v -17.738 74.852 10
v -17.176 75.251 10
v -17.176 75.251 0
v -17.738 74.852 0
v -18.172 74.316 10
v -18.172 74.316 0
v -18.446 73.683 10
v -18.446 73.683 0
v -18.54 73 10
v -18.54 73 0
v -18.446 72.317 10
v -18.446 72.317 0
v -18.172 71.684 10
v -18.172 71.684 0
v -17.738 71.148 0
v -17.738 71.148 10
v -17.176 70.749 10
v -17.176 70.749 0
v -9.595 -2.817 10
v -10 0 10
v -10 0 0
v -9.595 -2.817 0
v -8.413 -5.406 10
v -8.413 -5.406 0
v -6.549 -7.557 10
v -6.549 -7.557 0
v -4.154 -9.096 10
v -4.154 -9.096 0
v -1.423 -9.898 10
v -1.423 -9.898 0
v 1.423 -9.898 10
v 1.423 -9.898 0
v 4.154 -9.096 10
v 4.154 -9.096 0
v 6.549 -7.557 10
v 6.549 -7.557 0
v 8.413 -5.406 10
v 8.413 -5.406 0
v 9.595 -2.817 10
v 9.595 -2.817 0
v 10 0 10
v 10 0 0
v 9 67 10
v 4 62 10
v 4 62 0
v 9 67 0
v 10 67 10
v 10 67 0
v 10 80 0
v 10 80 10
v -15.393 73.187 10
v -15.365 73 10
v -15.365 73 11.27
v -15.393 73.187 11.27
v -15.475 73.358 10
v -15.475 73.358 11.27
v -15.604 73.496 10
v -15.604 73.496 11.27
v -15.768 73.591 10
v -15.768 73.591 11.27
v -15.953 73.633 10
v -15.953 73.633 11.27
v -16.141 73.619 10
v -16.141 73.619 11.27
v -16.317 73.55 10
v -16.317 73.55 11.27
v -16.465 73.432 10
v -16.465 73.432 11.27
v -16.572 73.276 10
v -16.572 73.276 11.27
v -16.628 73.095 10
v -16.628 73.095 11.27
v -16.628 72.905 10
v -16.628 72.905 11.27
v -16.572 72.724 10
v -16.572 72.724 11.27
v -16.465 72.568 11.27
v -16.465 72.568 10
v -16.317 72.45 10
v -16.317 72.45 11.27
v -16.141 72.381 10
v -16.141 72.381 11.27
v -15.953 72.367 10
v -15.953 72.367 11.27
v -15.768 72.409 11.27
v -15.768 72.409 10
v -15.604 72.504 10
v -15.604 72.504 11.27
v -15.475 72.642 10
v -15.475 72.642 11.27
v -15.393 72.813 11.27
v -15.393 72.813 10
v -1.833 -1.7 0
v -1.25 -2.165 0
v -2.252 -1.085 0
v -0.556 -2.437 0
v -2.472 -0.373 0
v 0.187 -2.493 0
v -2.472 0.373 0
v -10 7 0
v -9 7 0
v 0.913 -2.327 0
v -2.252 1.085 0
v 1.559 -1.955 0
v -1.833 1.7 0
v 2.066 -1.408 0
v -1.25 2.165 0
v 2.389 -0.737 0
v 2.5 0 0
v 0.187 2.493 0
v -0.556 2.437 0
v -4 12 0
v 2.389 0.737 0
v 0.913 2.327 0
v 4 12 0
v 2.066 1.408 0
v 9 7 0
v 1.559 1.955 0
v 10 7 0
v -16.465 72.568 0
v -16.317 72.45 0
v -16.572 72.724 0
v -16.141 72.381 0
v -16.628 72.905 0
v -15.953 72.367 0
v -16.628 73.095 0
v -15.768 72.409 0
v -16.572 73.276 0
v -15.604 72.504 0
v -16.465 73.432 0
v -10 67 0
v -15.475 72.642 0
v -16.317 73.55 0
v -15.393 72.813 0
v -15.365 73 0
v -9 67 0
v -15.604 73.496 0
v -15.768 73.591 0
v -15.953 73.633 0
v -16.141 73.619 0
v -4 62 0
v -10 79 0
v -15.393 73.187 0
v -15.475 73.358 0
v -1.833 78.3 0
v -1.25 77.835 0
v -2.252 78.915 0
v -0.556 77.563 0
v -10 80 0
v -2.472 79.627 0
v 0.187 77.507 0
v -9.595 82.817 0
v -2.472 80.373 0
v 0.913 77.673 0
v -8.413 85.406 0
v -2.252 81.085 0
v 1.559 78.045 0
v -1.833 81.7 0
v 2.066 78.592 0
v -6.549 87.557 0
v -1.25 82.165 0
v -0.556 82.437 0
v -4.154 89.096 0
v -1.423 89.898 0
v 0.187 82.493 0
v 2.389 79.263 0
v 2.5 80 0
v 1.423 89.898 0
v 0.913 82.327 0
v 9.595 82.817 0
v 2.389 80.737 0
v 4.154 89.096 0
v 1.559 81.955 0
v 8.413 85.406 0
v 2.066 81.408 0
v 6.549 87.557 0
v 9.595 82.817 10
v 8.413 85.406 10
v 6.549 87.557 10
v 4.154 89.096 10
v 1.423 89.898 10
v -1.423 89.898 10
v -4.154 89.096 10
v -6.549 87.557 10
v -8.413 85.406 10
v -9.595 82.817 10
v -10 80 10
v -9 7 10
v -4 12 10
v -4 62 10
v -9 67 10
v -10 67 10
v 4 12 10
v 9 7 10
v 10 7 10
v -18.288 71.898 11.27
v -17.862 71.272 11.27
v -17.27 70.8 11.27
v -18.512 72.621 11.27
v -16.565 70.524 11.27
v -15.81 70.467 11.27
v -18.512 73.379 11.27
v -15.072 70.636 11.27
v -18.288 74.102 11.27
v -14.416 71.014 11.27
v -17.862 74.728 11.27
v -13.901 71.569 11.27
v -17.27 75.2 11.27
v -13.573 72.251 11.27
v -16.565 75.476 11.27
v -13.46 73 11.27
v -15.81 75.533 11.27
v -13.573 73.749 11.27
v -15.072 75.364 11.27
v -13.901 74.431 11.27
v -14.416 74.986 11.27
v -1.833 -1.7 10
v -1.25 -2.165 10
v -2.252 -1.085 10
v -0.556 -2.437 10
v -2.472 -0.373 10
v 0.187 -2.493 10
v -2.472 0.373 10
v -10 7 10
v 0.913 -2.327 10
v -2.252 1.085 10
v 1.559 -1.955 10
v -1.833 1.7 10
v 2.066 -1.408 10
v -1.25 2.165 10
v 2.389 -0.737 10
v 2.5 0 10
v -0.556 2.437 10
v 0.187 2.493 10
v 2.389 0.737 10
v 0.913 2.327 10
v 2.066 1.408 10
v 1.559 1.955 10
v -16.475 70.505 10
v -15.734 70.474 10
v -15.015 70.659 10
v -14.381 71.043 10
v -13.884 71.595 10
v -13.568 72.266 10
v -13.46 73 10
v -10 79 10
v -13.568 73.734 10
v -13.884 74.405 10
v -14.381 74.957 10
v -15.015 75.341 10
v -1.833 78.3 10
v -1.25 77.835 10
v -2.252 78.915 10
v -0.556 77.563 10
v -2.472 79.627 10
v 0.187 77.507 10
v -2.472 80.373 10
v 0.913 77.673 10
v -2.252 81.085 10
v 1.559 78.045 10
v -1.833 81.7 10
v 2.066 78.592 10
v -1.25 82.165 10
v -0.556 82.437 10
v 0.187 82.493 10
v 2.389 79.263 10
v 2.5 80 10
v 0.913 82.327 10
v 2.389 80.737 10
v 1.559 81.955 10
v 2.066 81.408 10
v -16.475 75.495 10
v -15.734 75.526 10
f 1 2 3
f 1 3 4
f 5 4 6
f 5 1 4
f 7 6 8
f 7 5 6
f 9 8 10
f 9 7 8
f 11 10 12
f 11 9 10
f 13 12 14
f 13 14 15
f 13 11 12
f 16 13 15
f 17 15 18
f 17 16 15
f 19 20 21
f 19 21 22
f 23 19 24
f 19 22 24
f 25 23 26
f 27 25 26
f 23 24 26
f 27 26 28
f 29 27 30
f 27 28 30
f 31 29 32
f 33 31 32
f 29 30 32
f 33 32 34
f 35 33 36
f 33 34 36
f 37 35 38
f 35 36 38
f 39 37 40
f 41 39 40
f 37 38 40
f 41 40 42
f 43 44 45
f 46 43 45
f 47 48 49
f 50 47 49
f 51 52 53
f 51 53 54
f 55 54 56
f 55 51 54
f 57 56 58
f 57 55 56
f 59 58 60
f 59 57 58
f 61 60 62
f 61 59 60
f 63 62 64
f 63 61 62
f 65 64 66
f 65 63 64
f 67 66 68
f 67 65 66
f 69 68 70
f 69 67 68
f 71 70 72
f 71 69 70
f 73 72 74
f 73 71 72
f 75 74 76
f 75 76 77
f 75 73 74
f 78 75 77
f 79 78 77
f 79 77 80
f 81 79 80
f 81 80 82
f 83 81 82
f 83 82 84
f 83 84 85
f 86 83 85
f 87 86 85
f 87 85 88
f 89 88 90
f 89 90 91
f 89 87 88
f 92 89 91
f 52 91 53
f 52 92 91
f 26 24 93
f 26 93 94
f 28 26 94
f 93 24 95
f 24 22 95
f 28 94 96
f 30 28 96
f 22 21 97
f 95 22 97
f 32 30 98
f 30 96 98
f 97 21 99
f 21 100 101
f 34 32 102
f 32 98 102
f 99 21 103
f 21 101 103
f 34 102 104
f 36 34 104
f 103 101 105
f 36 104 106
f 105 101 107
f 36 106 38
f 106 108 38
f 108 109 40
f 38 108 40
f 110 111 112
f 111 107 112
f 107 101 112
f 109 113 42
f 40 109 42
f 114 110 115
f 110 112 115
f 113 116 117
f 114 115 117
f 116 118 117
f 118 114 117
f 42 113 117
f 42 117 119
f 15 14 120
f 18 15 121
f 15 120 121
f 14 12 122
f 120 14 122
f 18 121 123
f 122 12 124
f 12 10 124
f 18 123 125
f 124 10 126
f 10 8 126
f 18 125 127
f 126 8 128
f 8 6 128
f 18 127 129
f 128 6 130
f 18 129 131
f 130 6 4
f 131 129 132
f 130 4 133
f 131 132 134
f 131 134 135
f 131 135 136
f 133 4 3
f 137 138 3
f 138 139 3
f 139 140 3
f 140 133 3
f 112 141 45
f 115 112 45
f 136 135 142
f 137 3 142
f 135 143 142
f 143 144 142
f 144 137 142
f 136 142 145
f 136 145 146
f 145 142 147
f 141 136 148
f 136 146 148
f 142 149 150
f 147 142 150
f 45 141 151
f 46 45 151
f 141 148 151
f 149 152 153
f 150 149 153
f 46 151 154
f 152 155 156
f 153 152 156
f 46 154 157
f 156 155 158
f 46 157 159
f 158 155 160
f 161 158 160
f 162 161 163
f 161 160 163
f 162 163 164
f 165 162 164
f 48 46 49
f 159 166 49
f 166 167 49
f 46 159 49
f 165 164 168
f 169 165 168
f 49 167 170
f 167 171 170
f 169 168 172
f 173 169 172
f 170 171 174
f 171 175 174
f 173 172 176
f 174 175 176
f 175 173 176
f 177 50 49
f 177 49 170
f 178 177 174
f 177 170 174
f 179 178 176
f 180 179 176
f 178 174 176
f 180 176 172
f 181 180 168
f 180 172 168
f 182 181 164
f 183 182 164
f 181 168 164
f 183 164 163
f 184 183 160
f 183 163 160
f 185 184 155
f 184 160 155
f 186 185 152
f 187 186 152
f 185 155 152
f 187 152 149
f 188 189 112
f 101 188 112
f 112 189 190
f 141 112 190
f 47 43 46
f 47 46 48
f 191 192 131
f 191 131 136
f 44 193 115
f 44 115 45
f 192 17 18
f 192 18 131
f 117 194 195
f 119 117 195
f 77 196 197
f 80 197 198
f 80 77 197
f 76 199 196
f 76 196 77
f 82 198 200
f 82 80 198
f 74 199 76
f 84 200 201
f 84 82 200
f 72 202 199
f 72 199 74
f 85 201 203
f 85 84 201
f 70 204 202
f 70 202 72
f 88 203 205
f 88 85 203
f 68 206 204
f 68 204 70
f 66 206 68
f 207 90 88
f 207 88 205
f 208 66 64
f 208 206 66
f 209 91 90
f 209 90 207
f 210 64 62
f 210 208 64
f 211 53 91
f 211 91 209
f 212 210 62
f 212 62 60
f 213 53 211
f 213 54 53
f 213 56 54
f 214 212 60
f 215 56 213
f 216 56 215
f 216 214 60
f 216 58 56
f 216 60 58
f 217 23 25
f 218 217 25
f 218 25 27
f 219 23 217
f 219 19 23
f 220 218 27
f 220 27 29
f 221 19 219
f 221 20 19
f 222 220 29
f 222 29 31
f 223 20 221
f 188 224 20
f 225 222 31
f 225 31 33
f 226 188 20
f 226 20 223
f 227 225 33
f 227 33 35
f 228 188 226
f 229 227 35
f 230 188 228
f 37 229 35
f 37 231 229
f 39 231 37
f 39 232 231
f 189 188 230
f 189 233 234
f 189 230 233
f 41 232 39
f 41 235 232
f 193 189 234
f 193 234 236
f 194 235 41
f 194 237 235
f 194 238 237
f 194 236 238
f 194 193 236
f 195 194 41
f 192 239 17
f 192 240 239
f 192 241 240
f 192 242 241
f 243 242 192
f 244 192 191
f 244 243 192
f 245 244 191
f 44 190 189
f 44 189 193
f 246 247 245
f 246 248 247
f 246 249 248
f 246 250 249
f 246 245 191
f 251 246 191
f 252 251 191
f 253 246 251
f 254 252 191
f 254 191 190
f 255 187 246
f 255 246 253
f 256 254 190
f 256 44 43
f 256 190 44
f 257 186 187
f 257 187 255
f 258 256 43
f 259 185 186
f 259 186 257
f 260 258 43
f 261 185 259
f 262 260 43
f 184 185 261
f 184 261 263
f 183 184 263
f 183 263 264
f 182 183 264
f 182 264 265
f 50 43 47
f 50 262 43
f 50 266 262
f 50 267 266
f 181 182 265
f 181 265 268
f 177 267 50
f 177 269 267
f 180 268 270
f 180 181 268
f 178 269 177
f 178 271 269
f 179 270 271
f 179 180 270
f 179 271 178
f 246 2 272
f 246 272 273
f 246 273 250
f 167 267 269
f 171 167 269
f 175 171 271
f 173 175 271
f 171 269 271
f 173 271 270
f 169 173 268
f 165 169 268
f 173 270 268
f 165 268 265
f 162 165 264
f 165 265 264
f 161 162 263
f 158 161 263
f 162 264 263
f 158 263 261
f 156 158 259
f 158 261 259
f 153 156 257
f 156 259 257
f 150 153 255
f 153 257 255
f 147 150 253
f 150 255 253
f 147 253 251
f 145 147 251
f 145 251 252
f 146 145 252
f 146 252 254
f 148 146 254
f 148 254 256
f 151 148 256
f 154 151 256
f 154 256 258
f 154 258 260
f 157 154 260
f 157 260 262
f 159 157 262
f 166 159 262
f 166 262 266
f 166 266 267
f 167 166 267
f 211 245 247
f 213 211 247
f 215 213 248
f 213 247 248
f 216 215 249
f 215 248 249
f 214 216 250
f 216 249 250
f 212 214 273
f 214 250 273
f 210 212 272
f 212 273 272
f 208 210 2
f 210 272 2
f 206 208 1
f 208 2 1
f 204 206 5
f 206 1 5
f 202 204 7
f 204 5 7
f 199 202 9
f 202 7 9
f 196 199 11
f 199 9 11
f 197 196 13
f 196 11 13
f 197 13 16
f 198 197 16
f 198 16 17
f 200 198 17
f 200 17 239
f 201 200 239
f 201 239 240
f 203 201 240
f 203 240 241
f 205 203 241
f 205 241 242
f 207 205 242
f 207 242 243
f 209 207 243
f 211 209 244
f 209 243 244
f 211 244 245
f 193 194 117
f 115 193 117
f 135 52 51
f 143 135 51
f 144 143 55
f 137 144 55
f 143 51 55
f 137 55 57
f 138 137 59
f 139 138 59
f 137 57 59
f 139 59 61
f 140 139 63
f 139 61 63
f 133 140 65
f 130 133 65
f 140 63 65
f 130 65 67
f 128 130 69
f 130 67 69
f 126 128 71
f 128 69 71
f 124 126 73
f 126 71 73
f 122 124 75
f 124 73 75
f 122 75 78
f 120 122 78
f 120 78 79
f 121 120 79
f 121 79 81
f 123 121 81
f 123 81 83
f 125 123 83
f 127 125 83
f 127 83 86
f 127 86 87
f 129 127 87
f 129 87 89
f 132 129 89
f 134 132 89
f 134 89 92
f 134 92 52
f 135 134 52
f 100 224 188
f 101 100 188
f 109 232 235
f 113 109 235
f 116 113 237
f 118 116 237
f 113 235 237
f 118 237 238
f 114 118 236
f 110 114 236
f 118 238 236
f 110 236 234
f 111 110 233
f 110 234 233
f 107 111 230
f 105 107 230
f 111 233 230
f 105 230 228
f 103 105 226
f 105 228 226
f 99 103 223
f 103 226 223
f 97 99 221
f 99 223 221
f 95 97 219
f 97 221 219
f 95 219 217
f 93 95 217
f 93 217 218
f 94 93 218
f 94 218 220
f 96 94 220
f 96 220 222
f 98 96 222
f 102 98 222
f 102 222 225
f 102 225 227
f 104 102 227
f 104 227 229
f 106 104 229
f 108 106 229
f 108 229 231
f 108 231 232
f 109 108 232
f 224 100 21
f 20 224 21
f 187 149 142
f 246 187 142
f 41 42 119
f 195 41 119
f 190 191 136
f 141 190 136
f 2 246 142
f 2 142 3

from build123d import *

# Parameters (mm, degrees)
BOSS_EXTRUDE1_DEPTH     = 10
SKETCH2_R               = 2.5
CUT_EXTRUDE1_DEPTH      = 11
BOSS_EXTRUDE2_DEPTH     = 10
SKETCH4_R               = 0.635
CUT_EXTRUDE2_DEPTH      = 11
SKETCH5_R               = 2.54
SKETCH5_R_2             = 0.635
BOSS_EXTRUDE3_DEPTH     = 1.27
SKETCH6_W               = 6
SKETCH6_H               = 60
CUT_EXTRUDE3_DEPTH      = 2.27
CUT_EXTRUDE3_DEPTH_BACK = 11
CHAMFER1_SIZE           = 5


with BuildPart() as part:
    # Sketch1 → Boss-Extrude1 (new body)
    with BuildSketch(Plane.XY):
        with BuildLine():
            Line((-10, 80), (-10, 0))
            ThreePointArc((-10, 0), (0, -10), (10, 0))
            Line((10, 0), (10, 80))
            ThreePointArc((10, 80), (0, 90), (-10, 80))
        make_face()
    extrude(amount=BOSS_EXTRUDE1_DEPTH)

    # Sketch2 → Cut-Extrude1 (cut, through all)
    with BuildSketch(Plane.XY.offset(10)):
        Circle(SKETCH2_R)
        with Locations((0, 80)):
            Circle(SKETCH2_R)
    extrude(amount=-CUT_EXTRUDE1_DEPTH, mode=Mode.SUBTRACT)

    # Sketch3 → Boss-Extrude2 (add)
    with BuildSketch(Plane.XY.offset(10)):
        with BuildLine():
            Line((-10, 79), (-17.176061622, 75.251328288))
            ThreePointArc((-17.176061622, 75.251328288), (-18.54, 73), (-17.176061622, 70.748671712))
            Line((-17.176061622, 70.748671712), (-10, 67))
            Line((-10, 67), (-10, 79))
        make_face()
    extrude(amount=-BOSS_EXTRUDE2_DEPTH)

    # Sketch4 → Cut-Extrude2 (cut, through all)
    with BuildSketch(Plane.XY.offset(10)):
        with Locations((-16, 73)):
            Circle(SKETCH4_R)
    extrude(amount=-CUT_EXTRUDE2_DEPTH, mode=Mode.SUBTRACT)

    # Sketch5 → Boss-Extrude3 (add)
    with BuildSketch(Plane.XY.offset(10)):
        with Locations((-16, 73)):
            Circle(SKETCH5_R)
        with Locations((-16, 73)):
            Circle(SKETCH5_R_2, mode=Mode.SUBTRACT)
    extrude(amount=BOSS_EXTRUDE3_DEPTH)

    # Sketch6 → Cut-Extrude3 (cut, two sides)
    with BuildSketch(Plane.XY.offset(10)) as cut_extrude3_sk:
        with Locations((-7, 37)):
            Rectangle(SKETCH6_W, SKETCH6_H)
        with Locations((7, 37)):
            Rectangle(SKETCH6_W, SKETCH6_H)
    extrude(amount=CUT_EXTRUDE3_DEPTH, mode=Mode.SUBTRACT)
    extrude(cut_extrude3_sk.sketch, amount=-CUT_EXTRUDE3_DEPTH_BACK, mode=Mode.SUBTRACT)

    # Chamfer1
    chamfer1_edges = [part.edges().sort_by_distance(p)[0] for p in [
        (-4, 67, 5),
        (-4, 7, 5),
        (4, 7, 5),
        (4, 67, 5),
    ]]
    chamfer(chamfer1_edges, length=CHAMFER1_SIZE)


solid = part.part
